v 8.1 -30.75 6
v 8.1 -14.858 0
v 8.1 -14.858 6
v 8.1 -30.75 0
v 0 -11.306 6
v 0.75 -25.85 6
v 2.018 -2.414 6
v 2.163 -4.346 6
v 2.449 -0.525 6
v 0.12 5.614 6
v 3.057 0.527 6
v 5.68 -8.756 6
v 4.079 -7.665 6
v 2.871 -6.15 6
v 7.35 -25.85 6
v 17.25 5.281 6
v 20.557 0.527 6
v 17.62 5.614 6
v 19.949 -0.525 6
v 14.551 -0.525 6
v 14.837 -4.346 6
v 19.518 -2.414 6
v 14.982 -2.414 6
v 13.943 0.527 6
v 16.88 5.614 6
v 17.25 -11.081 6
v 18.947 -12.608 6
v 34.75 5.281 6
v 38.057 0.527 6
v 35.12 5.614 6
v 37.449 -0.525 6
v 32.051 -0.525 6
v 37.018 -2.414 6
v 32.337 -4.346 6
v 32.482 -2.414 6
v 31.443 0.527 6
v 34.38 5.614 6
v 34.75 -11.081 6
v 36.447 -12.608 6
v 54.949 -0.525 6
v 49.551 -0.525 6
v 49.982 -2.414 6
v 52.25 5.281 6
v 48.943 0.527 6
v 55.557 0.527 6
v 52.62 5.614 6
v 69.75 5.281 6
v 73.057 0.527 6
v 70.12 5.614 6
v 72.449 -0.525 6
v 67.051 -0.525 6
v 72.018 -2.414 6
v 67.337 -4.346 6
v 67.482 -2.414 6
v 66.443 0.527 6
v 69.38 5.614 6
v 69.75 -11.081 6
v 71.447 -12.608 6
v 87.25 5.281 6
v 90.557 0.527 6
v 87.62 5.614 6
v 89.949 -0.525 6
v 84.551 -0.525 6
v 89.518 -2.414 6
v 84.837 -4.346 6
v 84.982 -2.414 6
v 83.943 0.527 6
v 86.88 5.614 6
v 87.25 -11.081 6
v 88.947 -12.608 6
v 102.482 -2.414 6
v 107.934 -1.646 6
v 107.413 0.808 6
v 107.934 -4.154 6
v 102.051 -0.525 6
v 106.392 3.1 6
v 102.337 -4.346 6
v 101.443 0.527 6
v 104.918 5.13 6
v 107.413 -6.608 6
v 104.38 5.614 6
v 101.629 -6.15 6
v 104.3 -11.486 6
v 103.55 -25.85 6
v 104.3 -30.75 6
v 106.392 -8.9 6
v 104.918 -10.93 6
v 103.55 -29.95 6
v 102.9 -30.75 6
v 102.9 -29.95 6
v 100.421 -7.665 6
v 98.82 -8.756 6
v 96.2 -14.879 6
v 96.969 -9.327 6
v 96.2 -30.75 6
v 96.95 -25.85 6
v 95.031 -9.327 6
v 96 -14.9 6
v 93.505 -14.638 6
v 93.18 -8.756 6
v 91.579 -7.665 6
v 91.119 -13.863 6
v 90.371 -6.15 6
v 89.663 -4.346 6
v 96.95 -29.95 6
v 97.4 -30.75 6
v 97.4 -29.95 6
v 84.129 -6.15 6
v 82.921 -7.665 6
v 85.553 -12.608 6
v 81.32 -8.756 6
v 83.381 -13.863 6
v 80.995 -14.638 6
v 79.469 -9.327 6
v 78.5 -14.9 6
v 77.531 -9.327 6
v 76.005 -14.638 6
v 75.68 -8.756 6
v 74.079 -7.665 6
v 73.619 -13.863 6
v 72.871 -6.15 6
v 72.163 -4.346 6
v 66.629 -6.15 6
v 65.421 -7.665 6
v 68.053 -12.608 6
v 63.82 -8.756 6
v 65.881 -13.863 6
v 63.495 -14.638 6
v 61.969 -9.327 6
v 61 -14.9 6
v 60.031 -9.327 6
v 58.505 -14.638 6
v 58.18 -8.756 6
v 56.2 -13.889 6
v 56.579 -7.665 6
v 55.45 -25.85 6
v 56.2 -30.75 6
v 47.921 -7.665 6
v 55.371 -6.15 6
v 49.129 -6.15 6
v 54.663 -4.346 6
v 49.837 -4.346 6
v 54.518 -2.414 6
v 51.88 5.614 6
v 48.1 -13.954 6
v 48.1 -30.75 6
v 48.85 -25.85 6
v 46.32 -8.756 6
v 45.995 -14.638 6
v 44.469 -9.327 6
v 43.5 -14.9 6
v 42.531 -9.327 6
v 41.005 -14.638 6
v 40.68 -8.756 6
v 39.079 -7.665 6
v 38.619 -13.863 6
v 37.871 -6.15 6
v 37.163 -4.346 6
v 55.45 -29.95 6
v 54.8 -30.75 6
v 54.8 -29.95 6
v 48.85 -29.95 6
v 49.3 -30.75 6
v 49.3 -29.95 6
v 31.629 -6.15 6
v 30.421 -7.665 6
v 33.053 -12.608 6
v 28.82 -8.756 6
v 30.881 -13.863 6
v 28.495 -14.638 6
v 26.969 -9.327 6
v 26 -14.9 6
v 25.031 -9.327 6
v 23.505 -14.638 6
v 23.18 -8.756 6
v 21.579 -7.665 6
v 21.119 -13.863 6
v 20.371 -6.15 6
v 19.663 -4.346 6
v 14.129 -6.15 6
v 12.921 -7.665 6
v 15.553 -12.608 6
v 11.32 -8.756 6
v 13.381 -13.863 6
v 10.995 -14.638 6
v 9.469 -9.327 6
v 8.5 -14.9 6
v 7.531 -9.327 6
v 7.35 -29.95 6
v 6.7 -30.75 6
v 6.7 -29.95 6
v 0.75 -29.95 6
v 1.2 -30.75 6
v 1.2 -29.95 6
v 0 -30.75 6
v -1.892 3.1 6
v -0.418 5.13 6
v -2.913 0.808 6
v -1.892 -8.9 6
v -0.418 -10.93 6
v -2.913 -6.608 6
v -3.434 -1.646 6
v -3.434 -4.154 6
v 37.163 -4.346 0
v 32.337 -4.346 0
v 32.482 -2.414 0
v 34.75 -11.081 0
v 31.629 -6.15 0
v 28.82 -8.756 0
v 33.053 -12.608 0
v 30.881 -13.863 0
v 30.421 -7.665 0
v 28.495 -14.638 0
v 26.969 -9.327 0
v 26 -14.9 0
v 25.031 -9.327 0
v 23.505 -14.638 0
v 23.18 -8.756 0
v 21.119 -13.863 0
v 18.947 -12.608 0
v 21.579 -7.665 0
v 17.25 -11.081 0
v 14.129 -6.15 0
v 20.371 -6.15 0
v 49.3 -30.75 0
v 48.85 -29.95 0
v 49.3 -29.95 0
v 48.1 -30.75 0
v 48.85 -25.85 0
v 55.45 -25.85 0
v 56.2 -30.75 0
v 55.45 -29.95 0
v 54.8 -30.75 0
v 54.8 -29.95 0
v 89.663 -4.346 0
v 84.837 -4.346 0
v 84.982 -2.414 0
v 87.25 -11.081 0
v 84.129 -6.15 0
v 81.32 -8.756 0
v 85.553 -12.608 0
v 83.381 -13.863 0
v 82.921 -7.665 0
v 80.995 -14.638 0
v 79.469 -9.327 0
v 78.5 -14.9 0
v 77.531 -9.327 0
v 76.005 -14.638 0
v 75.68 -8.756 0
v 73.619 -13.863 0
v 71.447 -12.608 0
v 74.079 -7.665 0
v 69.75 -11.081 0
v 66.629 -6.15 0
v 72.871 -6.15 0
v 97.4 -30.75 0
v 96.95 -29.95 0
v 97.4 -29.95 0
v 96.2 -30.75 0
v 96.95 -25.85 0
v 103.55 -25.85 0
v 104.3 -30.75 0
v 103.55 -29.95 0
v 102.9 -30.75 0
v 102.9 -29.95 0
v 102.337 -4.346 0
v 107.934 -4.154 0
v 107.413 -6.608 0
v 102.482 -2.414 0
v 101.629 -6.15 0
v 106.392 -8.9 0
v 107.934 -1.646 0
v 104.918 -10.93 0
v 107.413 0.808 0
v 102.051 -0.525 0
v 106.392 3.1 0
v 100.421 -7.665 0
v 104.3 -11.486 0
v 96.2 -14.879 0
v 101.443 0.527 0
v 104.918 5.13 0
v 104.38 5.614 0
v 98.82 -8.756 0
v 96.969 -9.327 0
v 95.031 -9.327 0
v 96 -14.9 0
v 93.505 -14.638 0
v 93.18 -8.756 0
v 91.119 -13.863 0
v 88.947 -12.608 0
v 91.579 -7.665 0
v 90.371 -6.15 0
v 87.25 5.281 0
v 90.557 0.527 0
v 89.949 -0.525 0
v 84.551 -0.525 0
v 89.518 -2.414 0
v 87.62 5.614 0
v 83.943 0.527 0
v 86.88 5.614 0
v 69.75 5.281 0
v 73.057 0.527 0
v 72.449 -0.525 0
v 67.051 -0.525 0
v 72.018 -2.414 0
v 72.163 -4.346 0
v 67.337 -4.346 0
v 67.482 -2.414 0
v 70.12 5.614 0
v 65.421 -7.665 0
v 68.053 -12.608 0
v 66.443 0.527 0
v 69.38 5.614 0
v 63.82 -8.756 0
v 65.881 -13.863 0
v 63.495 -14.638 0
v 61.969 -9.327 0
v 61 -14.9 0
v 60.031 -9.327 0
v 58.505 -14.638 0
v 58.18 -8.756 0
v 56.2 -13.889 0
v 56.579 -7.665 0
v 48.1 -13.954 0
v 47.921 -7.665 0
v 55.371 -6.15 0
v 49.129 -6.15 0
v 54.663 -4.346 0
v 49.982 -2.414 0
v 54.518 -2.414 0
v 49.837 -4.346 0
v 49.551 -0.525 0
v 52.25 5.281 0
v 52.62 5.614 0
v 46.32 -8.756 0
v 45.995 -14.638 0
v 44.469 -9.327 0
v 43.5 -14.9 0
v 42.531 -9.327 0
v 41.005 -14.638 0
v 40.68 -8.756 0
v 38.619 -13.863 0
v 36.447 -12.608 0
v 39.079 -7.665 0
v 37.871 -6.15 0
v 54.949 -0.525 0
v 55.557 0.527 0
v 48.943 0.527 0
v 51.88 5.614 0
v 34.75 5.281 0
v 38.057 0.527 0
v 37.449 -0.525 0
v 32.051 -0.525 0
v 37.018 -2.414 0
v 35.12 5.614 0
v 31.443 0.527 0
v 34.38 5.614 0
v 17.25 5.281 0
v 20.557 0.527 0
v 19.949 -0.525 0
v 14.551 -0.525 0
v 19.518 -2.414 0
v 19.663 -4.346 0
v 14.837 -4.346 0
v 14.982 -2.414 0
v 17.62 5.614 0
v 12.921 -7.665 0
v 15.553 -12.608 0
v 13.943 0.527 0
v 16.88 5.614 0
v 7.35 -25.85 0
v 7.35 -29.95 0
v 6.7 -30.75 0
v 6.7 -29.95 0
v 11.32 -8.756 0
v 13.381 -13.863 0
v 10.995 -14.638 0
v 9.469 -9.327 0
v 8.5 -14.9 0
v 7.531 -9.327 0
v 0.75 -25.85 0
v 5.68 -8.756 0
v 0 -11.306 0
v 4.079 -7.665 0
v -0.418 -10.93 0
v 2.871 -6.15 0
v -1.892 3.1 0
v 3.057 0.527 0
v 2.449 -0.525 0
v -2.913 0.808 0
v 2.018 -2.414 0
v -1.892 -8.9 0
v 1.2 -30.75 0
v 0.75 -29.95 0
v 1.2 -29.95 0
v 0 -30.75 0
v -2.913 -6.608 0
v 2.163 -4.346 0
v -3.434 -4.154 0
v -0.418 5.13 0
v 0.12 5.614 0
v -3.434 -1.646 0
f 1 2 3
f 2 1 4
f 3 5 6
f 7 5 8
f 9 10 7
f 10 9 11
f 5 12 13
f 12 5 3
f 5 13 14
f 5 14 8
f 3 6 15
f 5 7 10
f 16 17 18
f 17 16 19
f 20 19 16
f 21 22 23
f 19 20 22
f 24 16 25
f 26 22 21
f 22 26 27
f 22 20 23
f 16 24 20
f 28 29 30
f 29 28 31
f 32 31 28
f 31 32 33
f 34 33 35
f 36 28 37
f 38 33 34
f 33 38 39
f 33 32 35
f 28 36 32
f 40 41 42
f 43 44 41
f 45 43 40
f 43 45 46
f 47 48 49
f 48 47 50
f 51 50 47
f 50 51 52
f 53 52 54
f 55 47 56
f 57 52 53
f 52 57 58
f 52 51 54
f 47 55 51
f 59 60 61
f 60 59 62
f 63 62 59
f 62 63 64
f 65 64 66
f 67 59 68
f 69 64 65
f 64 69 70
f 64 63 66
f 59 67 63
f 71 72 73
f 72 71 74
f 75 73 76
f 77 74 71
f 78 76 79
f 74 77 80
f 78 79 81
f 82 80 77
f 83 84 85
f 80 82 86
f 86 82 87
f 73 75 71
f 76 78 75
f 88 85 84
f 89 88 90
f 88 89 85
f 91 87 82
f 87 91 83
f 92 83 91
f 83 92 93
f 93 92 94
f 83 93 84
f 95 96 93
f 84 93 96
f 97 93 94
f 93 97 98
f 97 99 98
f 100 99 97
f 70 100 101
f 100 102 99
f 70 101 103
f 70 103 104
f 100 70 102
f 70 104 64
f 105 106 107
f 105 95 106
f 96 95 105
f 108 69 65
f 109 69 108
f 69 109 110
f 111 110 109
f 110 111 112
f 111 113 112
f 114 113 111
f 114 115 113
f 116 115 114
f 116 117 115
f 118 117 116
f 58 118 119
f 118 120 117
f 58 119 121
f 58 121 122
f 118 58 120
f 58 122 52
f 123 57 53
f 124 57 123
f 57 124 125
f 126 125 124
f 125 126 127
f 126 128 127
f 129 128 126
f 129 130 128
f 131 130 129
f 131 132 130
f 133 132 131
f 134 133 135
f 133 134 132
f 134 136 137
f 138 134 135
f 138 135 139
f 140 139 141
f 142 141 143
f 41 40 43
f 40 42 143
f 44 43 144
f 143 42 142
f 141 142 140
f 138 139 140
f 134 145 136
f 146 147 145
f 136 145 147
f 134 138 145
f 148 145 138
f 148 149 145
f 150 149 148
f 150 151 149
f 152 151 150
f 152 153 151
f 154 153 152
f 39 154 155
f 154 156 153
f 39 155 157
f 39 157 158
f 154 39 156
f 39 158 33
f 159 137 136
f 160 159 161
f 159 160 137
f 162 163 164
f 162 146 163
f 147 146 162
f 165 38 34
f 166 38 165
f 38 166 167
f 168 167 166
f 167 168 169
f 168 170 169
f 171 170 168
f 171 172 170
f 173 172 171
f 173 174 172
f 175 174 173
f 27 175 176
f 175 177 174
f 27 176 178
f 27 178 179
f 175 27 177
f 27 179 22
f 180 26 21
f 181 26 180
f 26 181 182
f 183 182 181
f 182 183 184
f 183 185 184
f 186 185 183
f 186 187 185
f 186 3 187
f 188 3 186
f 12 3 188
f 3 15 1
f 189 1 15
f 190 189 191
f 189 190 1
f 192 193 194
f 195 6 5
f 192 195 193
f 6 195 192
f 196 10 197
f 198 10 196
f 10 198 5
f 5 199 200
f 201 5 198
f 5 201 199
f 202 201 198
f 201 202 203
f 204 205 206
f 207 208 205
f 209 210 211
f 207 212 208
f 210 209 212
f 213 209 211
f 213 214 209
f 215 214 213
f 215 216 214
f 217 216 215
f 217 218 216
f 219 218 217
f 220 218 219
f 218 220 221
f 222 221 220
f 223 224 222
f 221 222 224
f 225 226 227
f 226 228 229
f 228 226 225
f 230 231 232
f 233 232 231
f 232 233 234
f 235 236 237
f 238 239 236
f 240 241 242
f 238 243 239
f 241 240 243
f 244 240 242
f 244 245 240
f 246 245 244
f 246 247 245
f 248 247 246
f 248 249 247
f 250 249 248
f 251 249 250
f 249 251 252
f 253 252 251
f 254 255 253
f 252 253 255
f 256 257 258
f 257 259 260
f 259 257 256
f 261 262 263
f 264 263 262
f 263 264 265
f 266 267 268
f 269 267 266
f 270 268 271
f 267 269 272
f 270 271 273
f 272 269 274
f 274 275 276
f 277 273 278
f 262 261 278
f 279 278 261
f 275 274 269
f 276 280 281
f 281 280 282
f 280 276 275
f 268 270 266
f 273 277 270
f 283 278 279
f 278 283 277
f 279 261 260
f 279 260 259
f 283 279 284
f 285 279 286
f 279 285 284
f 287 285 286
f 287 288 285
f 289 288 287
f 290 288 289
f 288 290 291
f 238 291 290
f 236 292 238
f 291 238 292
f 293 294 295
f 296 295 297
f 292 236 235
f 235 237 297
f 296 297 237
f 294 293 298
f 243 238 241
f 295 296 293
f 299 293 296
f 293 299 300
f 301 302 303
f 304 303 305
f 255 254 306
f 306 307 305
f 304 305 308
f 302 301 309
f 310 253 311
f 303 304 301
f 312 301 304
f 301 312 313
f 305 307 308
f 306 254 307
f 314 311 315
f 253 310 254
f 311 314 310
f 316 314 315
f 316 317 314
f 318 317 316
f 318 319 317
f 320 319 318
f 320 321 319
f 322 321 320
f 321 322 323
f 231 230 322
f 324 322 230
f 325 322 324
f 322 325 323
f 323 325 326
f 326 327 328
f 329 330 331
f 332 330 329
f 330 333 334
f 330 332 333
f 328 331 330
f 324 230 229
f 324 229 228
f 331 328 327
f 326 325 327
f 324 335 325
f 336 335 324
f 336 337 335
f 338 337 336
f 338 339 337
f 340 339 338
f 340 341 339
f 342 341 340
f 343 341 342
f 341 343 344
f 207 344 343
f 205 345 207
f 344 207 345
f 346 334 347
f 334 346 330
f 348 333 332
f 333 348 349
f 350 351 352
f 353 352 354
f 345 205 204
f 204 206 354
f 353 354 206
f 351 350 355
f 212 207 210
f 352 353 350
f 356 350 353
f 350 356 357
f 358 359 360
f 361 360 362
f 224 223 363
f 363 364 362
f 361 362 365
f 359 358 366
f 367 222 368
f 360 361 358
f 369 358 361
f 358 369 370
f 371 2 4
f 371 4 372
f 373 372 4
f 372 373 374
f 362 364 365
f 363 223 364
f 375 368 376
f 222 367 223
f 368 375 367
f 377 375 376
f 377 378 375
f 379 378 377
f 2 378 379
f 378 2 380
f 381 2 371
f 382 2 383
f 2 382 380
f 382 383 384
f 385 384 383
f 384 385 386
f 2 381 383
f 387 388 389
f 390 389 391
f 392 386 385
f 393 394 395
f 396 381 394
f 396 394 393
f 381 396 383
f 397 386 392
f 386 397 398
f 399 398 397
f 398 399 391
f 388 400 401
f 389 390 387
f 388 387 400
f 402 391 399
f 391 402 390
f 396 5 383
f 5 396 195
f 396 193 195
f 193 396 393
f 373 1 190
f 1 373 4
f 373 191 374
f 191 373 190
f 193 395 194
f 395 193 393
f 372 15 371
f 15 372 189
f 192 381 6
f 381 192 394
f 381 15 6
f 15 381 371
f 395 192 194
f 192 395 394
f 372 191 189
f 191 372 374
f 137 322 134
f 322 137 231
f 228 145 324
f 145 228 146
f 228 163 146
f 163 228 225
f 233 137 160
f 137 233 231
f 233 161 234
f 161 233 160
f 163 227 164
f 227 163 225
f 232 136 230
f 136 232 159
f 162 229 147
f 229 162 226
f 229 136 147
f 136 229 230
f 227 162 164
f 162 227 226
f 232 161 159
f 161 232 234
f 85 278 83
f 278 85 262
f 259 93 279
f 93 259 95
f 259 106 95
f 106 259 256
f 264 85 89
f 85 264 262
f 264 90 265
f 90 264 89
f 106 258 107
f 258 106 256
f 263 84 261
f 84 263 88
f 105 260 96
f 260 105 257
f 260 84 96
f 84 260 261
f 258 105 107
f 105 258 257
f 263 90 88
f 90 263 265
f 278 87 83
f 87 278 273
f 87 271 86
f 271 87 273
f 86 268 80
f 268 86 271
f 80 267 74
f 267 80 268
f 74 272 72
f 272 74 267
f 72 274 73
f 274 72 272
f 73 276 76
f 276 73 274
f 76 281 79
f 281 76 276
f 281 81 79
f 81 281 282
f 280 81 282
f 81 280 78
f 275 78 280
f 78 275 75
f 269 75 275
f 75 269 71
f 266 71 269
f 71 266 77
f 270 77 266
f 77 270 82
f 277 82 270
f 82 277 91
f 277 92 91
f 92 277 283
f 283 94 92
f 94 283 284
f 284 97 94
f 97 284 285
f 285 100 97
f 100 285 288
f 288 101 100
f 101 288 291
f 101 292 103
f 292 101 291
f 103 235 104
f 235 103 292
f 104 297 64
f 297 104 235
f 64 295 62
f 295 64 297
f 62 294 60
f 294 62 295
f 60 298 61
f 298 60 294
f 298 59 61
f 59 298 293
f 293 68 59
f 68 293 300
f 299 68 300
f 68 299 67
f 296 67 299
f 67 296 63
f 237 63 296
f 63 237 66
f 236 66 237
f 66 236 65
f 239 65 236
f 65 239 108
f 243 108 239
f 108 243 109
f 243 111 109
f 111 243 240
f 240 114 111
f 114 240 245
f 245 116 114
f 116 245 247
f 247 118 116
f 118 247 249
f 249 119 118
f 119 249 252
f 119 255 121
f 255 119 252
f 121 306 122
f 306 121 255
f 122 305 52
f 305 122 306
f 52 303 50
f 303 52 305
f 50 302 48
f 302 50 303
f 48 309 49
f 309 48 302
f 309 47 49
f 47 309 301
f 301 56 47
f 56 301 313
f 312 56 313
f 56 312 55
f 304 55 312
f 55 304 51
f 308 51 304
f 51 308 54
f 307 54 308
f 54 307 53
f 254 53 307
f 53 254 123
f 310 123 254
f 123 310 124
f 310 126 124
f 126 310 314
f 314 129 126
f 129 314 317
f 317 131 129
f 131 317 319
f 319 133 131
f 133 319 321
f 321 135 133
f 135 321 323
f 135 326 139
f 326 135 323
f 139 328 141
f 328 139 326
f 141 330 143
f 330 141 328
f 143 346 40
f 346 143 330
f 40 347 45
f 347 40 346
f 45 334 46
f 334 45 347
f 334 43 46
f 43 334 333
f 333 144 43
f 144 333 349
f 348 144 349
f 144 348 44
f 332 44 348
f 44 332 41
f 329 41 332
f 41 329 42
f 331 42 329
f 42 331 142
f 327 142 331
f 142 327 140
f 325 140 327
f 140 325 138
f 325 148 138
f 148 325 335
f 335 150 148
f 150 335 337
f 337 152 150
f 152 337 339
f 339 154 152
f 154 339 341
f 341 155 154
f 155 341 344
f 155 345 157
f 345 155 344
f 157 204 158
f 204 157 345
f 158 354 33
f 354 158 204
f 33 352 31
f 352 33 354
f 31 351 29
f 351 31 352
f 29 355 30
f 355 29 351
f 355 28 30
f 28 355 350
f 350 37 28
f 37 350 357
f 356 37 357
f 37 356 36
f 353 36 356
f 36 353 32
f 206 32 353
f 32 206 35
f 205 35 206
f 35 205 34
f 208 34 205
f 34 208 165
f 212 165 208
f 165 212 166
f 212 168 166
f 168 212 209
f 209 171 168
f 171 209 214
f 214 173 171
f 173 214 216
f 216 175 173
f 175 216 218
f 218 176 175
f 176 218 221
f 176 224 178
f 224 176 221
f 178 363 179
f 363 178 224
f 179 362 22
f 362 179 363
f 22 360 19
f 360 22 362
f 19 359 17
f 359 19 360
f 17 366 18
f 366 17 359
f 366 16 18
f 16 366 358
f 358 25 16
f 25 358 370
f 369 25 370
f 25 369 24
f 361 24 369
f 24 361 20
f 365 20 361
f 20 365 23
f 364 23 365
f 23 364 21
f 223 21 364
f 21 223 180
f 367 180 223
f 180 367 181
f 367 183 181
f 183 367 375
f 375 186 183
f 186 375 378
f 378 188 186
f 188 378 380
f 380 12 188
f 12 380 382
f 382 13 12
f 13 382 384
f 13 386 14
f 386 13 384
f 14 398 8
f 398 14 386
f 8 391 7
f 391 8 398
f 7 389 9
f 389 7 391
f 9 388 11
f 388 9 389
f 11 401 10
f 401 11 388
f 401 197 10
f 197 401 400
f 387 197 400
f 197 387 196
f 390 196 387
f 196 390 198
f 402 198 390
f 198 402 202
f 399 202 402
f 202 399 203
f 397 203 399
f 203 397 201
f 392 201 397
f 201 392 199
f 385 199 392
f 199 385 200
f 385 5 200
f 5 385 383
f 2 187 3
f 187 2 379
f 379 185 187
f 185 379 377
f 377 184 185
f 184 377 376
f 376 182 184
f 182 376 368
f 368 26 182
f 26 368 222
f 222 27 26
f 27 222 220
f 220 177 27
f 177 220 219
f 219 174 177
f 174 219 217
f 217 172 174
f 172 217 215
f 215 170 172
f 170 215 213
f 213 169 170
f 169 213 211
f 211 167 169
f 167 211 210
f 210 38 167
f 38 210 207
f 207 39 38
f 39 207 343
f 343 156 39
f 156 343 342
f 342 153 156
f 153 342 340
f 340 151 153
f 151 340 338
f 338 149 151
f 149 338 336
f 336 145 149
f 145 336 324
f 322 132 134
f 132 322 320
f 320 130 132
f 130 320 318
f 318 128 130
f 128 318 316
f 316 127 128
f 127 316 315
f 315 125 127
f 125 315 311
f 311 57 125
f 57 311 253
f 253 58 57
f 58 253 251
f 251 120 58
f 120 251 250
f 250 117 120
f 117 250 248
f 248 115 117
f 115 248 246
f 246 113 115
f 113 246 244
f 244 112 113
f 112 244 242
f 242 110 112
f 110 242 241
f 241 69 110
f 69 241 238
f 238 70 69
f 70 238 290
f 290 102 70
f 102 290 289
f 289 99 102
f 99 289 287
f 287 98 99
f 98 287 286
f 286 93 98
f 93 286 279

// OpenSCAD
module rodHolder() {
  translate([0, 0, 0]) linear_extrude(6)
    difference() {
      circle(d=20, $fn = 64);
      circle(d=15.5, $fn = 64);
      offset(0.1) {
        difference() {
          circle(d = 17, $fn = 12);
          circle(d = 13.8, $fn = 12);
          rotate([0, 0, 93]) square([20, 8], center = true);
          rotate([0, 0, 87]) square([20, 8], center = true);
        }
        
        translate([-8, -1.2, 0]) square([16, 2.4]);
      }
    }
}

module baseHolder() {
  difference() {
  translate([0, -10, 0])
    difference() {
      cube([8.1, 20.125, 6]);
      translate([1.2, -.5, -1]) cube([5.5, 5.1, 12]);
      translate([.75, .8, -1]) cube([6.6, 4.1, 12]);
    }
    
    *translate([ 0,0,-1]) linear_extrude(20) translate([9.7, 21, 0]) circle(d=20, $fn = 64);
  }
}

*for (i = [0 : 1 : 2]) 
  translate([i * 18, 0, 0]) rotate([0, 0, 90]) rodHolder();


x1 = 0;
x2 = 8.1 + 40;
x3 = x2 + 8.1 + 40;

translate([0, 0, 0]) {
  translate([x1, -20.75, 0]) baseHolder();
  translate([x2, -20.75, 0]) baseHolder();
  translate([x3, -20.75, 0]) baseHolder();
}

linear_extrude(6)
translate([8.5, -2.9, 0])
difference() {
  union() {
    for (i = [0 : 1 : 5]) 
      translate([i * 17.5, 0, 0]) rotate([0, 0, 90]) circle(d=24);
  }

  for (i = [0 : 1 : 5])  {
    translate([i * 17.5, 7, 0]) rotate([0, 0, 30]) circle(d = 26, $fn = 3);
    translate([i * 17.5, 0, 0]) rotate([0, 0, 90]) circle(d=13);
  }
}
